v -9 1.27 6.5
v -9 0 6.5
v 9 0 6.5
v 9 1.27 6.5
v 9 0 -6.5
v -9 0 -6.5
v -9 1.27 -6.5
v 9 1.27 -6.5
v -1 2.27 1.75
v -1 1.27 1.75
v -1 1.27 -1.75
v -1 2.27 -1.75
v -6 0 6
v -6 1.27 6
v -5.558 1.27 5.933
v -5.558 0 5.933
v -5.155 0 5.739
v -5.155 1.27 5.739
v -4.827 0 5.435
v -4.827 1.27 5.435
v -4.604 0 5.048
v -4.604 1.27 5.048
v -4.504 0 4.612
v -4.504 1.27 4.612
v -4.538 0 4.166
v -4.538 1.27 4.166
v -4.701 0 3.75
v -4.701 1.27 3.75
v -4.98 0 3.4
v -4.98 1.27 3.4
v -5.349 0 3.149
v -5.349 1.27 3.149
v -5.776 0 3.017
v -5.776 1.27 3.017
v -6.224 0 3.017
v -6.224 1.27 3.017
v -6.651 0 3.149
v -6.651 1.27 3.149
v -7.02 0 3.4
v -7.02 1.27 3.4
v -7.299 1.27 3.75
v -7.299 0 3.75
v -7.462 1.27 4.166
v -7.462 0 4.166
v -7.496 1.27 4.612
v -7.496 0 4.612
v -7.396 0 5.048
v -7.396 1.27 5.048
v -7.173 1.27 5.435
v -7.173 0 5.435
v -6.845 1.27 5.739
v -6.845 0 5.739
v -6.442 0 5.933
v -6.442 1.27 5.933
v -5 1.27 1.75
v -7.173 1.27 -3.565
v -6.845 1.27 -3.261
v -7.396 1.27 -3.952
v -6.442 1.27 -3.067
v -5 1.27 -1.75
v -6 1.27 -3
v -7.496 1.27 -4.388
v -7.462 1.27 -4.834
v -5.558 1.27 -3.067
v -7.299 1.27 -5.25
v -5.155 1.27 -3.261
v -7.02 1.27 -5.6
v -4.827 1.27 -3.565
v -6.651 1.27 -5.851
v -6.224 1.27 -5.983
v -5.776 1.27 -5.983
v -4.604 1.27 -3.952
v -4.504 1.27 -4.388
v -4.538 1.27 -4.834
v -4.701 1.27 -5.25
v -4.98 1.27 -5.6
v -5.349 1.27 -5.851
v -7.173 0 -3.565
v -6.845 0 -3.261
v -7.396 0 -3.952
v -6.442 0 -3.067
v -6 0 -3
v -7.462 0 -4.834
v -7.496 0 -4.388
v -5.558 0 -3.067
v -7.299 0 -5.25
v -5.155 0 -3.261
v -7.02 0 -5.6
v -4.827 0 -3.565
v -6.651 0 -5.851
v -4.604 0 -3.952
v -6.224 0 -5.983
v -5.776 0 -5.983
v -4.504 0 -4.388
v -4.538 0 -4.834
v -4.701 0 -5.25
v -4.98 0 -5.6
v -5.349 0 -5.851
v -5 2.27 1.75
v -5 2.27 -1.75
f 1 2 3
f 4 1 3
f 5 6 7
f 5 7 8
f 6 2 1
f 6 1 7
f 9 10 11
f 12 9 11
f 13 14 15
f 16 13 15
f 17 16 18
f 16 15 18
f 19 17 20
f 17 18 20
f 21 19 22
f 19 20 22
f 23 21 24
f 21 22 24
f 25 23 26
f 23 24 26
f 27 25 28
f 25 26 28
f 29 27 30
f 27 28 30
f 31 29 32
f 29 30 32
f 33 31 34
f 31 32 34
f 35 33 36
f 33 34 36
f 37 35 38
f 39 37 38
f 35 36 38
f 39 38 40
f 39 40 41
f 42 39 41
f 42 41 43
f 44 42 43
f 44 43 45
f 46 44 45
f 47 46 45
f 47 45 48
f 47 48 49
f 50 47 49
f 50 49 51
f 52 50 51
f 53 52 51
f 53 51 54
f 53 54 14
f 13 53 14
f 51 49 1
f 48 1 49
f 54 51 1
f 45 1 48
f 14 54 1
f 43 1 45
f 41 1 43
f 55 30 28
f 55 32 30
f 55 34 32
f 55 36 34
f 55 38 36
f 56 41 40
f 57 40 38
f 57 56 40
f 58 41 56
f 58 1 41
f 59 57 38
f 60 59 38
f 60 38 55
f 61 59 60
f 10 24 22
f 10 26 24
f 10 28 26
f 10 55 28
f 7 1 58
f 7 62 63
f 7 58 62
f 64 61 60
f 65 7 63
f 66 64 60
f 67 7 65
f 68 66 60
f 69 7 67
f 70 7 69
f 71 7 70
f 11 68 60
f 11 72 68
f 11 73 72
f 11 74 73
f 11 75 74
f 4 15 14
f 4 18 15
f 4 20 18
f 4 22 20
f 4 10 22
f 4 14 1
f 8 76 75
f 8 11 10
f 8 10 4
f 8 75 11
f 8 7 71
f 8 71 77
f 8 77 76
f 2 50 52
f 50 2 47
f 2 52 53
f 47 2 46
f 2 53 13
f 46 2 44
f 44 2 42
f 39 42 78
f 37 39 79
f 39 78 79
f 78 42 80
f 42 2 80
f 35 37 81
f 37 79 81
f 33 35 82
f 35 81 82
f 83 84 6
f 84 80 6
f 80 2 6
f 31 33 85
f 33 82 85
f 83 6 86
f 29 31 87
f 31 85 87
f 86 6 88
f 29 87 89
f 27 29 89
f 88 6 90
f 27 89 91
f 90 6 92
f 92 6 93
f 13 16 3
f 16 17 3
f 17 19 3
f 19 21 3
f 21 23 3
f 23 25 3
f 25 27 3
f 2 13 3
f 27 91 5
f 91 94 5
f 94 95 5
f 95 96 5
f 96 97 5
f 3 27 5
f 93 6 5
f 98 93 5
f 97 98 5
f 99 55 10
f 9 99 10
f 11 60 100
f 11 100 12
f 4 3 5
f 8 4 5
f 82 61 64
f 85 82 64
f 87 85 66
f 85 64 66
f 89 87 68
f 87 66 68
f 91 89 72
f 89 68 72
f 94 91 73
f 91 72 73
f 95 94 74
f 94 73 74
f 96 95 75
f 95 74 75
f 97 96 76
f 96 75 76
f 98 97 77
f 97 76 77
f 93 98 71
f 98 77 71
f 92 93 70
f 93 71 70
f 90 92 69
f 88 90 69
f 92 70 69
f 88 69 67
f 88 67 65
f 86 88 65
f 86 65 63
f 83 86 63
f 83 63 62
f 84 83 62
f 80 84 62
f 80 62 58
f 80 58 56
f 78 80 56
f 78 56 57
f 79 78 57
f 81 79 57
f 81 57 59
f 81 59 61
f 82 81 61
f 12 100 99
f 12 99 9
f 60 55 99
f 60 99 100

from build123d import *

# Parameters (mm, degrees)
SKETCH1_W           = 18
SKETCH1_H           = 13
BOSS_EXTRUDE1_DEPTH = 1.27
CUT_EXTRUDE1_REACH  = 13.174
SKETCH2_R           = 1.5
CUT_EXTRUDE2_REACH  = 13.174
SKETCH3_R           = 1.5
SKETCH4_W           = 4
SKETCH4_H           = 3.5
BOSS_EXTRUDE2_DEPTH = 1


with BuildPart() as part:
    # Sketch1 → Boss-Extrude1 (new body)
    with BuildSketch(Plane(origin=(0, 0, 0), x_dir=(1, 0, 0), z_dir=(0, 1, 0))):
        Rectangle(SKETCH1_W, SKETCH1_H)
    extrude(amount=BOSS_EXTRUDE1_DEPTH)

    # Sketch2 → Cut-Extrude1 (cut, up to next)
    with BuildSketch(Plane(origin=(0, 1.27, 0), x_dir=(1, 0, 0), z_dir=(0, 1, 0)), mode=Mode.PRIVATE) as cut_extrude1_sk1:
        with Locations(Location((-6, 4.5, 0), (0, 0, 270))):
            Circle(SKETCH2_R)
    cut_extrude1_tool1 = extrude(cut_extrude1_sk1.sketch, amount=-CUT_EXTRUDE1_REACH, mode=Mode.PRIVATE) & part.part
    add(cut_extrude1_tool1.solids().sort_by_distance((-6, 1.27, -4.5))[0], mode=Mode.SUBTRACT)

    # Sketch3 → Cut-Extrude2 (cut, up to next)
    with BuildSketch(Plane(origin=(0, 1.27, 0), x_dir=(1, 0, 0), z_dir=(0, 1, 0)), mode=Mode.PRIVATE) as cut_extrude2_sk1:
        with Locations(Location((-6, -4.5, 0), (0, 0, 270))):
            Circle(SKETCH3_R)
    cut_extrude2_tool1 = extrude(cut_extrude2_sk1.sketch, amount=-CUT_EXTRUDE2_REACH, mode=Mode.PRIVATE) & part.part
    add(cut_extrude2_tool1.solids().sort_by_distance((-6, 1.27, 4.5))[0], mode=Mode.SUBTRACT)

    # Sketch4 → Boss-Extrude2 (add)
    with BuildSketch(Plane(origin=(0, 1.27, 0), x_dir=(1, 0, 0), z_dir=(0, 1, 0))):
        with Locations((-3, 0)):
            Rectangle(SKETCH4_W, SKETCH4_H)
    extrude(amount=BOSS_EXTRUDE2_DEPTH)


solid = part.part
